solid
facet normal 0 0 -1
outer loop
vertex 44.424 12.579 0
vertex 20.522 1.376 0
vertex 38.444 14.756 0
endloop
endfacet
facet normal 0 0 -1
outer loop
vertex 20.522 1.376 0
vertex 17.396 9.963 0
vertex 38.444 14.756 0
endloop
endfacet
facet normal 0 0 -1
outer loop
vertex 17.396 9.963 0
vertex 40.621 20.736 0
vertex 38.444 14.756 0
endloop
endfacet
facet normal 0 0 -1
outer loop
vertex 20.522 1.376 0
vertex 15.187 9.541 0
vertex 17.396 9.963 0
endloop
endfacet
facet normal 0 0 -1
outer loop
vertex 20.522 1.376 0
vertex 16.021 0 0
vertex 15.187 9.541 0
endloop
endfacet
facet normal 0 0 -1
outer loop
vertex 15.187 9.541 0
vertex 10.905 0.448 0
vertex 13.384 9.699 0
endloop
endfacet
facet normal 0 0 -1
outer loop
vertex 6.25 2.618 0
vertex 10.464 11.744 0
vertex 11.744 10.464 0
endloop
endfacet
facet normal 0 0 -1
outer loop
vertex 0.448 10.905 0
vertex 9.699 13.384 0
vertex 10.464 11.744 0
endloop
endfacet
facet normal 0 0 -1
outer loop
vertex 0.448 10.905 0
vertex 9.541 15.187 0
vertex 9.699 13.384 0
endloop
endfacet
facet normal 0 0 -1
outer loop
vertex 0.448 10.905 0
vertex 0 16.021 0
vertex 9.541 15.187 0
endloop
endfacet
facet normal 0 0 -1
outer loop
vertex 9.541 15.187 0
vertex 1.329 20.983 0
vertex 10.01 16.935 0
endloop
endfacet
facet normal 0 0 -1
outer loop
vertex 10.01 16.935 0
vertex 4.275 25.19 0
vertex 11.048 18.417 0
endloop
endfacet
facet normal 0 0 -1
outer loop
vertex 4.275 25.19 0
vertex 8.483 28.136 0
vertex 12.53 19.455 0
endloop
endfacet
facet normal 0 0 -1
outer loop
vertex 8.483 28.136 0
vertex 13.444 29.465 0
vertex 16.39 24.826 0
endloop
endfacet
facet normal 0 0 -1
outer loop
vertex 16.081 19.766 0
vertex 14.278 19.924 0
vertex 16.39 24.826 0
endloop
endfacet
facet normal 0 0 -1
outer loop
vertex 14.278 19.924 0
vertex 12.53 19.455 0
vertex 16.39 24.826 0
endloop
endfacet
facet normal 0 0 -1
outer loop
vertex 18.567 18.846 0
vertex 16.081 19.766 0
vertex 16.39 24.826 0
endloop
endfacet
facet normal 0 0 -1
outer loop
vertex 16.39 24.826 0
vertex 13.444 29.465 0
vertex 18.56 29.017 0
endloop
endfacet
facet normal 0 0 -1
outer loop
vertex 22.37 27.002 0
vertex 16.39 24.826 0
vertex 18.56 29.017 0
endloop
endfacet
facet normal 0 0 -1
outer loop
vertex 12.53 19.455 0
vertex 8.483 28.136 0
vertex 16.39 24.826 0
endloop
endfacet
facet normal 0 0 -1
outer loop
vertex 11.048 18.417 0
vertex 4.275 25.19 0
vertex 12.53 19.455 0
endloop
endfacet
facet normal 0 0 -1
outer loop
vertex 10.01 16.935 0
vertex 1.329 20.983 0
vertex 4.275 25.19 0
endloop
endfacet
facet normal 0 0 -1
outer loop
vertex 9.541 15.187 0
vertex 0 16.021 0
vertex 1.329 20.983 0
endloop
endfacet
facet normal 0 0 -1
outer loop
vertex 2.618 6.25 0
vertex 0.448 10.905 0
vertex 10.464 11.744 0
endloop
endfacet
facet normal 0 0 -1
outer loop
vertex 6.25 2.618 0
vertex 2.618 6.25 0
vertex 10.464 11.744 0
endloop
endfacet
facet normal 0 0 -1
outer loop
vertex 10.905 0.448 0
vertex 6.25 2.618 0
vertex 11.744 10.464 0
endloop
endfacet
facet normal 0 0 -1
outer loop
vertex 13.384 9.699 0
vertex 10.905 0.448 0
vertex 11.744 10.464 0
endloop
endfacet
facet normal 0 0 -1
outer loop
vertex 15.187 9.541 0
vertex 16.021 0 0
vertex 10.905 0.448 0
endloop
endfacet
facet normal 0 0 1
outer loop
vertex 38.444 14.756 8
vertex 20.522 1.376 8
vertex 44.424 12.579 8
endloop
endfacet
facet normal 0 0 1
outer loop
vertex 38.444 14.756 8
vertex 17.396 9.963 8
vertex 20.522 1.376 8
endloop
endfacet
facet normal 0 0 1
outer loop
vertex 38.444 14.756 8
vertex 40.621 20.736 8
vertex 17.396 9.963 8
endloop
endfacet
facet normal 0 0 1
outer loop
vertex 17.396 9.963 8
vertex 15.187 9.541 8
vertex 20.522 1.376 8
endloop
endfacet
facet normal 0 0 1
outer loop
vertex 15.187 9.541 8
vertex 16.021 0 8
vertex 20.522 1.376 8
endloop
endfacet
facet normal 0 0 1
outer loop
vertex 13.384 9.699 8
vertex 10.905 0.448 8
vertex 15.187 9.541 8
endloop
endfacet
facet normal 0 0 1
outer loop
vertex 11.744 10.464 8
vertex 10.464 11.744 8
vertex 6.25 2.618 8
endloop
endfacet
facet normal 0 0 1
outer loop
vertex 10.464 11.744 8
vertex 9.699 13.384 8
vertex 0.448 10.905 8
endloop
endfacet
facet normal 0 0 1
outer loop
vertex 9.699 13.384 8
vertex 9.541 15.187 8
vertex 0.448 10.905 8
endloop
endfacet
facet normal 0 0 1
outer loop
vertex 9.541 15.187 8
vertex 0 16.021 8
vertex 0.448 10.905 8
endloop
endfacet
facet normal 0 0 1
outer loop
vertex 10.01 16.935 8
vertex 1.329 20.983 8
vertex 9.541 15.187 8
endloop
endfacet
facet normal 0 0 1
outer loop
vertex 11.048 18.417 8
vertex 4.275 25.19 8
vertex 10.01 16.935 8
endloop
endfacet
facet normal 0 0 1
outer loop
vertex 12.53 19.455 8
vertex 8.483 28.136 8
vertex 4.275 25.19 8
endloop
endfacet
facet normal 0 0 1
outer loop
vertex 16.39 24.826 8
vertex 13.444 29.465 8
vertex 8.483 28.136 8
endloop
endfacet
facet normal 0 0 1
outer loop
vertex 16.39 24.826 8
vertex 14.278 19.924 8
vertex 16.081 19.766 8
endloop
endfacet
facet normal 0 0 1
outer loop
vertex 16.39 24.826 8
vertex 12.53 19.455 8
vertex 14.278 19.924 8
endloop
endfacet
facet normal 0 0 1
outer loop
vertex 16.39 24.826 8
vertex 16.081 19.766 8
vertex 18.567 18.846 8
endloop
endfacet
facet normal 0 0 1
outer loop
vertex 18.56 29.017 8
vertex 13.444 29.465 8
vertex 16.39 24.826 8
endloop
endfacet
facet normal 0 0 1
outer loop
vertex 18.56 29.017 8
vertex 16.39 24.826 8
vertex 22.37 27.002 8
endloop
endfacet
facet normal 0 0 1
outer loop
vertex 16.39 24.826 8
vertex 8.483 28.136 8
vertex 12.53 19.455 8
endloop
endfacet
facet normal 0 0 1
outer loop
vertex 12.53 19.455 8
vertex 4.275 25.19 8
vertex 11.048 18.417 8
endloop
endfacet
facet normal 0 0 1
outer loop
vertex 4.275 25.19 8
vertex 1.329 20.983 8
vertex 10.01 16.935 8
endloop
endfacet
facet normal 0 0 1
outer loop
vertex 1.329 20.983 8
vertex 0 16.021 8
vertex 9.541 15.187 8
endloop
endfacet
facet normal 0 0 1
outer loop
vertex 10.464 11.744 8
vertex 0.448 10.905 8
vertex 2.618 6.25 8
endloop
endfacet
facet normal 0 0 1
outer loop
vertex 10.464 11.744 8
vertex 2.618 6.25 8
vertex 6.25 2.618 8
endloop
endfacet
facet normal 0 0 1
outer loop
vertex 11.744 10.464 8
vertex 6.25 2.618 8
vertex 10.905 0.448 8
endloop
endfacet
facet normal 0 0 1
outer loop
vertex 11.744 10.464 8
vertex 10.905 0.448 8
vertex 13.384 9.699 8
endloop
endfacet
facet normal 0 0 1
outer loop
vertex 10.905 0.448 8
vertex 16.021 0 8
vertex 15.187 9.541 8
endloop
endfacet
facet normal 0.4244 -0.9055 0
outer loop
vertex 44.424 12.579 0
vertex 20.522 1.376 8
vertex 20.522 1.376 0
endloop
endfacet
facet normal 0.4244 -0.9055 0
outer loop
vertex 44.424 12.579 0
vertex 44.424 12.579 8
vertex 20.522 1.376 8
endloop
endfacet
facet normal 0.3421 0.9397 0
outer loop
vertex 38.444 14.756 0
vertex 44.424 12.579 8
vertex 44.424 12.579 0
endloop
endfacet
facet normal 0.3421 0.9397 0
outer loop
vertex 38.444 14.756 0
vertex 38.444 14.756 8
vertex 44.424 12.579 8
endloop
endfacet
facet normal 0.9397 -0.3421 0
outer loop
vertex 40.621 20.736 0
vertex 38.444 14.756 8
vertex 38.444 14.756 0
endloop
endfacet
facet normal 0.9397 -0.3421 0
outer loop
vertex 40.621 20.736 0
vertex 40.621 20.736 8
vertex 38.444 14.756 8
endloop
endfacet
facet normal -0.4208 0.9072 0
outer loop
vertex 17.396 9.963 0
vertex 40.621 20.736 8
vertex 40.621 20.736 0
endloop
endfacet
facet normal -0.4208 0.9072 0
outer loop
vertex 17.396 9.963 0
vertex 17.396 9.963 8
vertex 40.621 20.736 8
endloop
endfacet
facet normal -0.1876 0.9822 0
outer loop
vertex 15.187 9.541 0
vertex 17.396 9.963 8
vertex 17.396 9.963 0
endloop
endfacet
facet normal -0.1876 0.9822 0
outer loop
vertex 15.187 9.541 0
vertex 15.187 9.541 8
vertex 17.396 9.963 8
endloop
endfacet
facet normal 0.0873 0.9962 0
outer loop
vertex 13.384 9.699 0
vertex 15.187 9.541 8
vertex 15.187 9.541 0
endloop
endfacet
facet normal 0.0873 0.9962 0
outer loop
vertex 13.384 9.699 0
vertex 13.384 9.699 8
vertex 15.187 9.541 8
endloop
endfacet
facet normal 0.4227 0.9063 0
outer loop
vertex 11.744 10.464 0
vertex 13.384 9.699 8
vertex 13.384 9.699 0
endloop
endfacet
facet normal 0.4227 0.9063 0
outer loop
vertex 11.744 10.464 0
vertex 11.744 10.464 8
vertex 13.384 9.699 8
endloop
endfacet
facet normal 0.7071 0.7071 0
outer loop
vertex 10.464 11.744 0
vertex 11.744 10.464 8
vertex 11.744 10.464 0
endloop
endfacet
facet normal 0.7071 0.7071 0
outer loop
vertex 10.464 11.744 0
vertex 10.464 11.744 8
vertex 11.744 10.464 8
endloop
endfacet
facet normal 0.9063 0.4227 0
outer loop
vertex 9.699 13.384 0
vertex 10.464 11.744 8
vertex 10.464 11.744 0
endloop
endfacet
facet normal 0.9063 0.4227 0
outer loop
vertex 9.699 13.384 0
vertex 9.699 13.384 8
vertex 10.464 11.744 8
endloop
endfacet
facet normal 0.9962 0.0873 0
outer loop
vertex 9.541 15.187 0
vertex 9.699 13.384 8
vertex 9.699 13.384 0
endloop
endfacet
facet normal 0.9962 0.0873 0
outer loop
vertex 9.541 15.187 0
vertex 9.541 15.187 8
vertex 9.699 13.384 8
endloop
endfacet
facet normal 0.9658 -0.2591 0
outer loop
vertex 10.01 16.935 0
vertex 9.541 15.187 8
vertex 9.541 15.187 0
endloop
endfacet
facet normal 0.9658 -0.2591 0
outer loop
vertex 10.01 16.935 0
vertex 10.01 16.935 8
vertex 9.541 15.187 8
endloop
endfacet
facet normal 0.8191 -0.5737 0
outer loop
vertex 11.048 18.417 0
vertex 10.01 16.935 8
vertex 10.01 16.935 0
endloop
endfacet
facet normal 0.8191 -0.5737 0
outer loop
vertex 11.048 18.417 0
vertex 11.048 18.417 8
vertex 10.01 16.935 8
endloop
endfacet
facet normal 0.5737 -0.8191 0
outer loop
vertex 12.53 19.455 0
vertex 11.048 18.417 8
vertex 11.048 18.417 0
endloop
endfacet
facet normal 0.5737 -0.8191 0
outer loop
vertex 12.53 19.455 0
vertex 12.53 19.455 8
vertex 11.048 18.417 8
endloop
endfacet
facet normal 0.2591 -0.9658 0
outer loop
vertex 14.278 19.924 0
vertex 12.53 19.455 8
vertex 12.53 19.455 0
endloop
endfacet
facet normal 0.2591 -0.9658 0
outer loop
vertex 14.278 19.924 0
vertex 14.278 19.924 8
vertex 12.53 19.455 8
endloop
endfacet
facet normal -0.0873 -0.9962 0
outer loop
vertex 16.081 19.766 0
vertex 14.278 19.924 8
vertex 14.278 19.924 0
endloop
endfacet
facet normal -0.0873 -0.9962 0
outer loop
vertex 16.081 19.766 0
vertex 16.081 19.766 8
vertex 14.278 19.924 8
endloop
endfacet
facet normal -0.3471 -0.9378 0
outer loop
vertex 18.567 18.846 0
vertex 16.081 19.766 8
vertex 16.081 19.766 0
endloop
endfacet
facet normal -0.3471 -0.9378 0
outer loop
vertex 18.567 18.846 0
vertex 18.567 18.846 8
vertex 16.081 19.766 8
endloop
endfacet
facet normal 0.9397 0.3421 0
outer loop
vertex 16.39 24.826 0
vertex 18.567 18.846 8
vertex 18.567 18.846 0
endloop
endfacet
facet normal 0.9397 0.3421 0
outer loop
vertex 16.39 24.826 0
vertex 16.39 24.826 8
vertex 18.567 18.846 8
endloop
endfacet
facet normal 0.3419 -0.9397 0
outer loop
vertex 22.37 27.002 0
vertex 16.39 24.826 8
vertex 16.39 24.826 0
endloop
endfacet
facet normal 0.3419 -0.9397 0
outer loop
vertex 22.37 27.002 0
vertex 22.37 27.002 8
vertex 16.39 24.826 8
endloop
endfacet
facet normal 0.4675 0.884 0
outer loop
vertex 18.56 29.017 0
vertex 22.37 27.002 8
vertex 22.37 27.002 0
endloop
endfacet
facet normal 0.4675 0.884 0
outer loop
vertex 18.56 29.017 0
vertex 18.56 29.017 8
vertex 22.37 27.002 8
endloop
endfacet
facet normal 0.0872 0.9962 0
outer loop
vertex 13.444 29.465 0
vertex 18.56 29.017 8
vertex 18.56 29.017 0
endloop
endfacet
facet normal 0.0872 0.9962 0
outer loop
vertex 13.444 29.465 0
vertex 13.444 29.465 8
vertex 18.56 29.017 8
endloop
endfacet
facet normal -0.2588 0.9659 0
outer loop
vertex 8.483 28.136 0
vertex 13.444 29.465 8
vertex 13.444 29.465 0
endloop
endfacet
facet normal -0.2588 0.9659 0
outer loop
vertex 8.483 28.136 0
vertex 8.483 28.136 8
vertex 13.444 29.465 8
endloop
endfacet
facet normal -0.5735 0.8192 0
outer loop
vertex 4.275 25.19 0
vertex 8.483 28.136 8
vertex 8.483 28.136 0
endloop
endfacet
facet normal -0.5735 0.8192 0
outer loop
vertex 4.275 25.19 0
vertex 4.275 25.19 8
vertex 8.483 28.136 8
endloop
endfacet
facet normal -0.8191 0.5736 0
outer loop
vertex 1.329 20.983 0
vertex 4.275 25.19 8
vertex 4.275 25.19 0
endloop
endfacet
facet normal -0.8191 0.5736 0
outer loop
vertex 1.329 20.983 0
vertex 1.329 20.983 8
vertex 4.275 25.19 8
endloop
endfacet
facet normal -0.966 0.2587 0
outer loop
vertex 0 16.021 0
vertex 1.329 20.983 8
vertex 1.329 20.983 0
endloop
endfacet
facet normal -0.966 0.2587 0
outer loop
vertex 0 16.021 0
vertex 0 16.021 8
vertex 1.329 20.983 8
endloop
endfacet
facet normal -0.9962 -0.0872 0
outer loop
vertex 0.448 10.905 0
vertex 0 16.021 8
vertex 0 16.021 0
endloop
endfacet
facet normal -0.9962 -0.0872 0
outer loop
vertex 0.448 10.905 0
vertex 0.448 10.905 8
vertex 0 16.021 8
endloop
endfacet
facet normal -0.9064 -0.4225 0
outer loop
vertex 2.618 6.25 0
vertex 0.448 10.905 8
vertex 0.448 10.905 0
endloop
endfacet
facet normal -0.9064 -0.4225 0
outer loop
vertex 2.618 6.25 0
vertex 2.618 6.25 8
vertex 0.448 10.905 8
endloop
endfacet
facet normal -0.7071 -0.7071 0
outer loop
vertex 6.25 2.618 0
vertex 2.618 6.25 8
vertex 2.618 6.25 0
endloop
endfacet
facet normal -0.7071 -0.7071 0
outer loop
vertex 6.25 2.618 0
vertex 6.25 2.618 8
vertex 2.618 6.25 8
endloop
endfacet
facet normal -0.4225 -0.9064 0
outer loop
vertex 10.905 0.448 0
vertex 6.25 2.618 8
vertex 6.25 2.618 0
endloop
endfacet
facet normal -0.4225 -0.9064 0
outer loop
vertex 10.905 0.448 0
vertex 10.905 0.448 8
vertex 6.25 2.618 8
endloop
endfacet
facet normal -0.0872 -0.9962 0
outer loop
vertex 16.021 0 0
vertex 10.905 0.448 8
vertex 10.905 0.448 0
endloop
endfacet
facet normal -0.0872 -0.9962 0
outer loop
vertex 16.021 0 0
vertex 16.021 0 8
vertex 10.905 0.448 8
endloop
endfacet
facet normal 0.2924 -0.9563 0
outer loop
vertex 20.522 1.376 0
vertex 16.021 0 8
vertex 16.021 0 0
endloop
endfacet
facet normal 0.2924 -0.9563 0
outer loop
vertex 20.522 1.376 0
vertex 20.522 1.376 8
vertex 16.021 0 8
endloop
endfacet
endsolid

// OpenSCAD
$fn = 32;

// ----------------------------------------------------------------------
// Eye lug: ring_tail, 8 mm thick
// ----------------------------------------------------------------------

// --- parameters (mm) ---
profile_height = 8;       // extrusion height
profile_points = 30;      // points of the closed outline

profile = [[16.39, 24.826], [22.37, 27.002], [18.56, 29.017], [13.444, 29.465], [8.483, 28.136], [4.275, 25.19], [1.329, 20.983], [0, 16.021], [0.448, 10.905], [2.618, 6.25], [6.25, 2.618], [10.905, 0.448], [16.021, 0], [20.522, 1.376], [44.424, 12.579], [38.444, 14.756], [40.621, 20.736], [17.396, 9.963], [15.187, 9.541], [13.384, 9.699], [11.744, 10.464], [10.464, 11.744], [9.699, 13.384], [9.541, 15.187], [10.01, 16.935], [11.048, 18.417], [12.53, 19.455], [14.278, 19.924], [16.081, 19.766], [18.567, 18.846]];  // single closed polygon, 30 points, counter clockwise

// --- the one profile operation ---
linear_extrude(height = profile_height) polygon(points = profile);
